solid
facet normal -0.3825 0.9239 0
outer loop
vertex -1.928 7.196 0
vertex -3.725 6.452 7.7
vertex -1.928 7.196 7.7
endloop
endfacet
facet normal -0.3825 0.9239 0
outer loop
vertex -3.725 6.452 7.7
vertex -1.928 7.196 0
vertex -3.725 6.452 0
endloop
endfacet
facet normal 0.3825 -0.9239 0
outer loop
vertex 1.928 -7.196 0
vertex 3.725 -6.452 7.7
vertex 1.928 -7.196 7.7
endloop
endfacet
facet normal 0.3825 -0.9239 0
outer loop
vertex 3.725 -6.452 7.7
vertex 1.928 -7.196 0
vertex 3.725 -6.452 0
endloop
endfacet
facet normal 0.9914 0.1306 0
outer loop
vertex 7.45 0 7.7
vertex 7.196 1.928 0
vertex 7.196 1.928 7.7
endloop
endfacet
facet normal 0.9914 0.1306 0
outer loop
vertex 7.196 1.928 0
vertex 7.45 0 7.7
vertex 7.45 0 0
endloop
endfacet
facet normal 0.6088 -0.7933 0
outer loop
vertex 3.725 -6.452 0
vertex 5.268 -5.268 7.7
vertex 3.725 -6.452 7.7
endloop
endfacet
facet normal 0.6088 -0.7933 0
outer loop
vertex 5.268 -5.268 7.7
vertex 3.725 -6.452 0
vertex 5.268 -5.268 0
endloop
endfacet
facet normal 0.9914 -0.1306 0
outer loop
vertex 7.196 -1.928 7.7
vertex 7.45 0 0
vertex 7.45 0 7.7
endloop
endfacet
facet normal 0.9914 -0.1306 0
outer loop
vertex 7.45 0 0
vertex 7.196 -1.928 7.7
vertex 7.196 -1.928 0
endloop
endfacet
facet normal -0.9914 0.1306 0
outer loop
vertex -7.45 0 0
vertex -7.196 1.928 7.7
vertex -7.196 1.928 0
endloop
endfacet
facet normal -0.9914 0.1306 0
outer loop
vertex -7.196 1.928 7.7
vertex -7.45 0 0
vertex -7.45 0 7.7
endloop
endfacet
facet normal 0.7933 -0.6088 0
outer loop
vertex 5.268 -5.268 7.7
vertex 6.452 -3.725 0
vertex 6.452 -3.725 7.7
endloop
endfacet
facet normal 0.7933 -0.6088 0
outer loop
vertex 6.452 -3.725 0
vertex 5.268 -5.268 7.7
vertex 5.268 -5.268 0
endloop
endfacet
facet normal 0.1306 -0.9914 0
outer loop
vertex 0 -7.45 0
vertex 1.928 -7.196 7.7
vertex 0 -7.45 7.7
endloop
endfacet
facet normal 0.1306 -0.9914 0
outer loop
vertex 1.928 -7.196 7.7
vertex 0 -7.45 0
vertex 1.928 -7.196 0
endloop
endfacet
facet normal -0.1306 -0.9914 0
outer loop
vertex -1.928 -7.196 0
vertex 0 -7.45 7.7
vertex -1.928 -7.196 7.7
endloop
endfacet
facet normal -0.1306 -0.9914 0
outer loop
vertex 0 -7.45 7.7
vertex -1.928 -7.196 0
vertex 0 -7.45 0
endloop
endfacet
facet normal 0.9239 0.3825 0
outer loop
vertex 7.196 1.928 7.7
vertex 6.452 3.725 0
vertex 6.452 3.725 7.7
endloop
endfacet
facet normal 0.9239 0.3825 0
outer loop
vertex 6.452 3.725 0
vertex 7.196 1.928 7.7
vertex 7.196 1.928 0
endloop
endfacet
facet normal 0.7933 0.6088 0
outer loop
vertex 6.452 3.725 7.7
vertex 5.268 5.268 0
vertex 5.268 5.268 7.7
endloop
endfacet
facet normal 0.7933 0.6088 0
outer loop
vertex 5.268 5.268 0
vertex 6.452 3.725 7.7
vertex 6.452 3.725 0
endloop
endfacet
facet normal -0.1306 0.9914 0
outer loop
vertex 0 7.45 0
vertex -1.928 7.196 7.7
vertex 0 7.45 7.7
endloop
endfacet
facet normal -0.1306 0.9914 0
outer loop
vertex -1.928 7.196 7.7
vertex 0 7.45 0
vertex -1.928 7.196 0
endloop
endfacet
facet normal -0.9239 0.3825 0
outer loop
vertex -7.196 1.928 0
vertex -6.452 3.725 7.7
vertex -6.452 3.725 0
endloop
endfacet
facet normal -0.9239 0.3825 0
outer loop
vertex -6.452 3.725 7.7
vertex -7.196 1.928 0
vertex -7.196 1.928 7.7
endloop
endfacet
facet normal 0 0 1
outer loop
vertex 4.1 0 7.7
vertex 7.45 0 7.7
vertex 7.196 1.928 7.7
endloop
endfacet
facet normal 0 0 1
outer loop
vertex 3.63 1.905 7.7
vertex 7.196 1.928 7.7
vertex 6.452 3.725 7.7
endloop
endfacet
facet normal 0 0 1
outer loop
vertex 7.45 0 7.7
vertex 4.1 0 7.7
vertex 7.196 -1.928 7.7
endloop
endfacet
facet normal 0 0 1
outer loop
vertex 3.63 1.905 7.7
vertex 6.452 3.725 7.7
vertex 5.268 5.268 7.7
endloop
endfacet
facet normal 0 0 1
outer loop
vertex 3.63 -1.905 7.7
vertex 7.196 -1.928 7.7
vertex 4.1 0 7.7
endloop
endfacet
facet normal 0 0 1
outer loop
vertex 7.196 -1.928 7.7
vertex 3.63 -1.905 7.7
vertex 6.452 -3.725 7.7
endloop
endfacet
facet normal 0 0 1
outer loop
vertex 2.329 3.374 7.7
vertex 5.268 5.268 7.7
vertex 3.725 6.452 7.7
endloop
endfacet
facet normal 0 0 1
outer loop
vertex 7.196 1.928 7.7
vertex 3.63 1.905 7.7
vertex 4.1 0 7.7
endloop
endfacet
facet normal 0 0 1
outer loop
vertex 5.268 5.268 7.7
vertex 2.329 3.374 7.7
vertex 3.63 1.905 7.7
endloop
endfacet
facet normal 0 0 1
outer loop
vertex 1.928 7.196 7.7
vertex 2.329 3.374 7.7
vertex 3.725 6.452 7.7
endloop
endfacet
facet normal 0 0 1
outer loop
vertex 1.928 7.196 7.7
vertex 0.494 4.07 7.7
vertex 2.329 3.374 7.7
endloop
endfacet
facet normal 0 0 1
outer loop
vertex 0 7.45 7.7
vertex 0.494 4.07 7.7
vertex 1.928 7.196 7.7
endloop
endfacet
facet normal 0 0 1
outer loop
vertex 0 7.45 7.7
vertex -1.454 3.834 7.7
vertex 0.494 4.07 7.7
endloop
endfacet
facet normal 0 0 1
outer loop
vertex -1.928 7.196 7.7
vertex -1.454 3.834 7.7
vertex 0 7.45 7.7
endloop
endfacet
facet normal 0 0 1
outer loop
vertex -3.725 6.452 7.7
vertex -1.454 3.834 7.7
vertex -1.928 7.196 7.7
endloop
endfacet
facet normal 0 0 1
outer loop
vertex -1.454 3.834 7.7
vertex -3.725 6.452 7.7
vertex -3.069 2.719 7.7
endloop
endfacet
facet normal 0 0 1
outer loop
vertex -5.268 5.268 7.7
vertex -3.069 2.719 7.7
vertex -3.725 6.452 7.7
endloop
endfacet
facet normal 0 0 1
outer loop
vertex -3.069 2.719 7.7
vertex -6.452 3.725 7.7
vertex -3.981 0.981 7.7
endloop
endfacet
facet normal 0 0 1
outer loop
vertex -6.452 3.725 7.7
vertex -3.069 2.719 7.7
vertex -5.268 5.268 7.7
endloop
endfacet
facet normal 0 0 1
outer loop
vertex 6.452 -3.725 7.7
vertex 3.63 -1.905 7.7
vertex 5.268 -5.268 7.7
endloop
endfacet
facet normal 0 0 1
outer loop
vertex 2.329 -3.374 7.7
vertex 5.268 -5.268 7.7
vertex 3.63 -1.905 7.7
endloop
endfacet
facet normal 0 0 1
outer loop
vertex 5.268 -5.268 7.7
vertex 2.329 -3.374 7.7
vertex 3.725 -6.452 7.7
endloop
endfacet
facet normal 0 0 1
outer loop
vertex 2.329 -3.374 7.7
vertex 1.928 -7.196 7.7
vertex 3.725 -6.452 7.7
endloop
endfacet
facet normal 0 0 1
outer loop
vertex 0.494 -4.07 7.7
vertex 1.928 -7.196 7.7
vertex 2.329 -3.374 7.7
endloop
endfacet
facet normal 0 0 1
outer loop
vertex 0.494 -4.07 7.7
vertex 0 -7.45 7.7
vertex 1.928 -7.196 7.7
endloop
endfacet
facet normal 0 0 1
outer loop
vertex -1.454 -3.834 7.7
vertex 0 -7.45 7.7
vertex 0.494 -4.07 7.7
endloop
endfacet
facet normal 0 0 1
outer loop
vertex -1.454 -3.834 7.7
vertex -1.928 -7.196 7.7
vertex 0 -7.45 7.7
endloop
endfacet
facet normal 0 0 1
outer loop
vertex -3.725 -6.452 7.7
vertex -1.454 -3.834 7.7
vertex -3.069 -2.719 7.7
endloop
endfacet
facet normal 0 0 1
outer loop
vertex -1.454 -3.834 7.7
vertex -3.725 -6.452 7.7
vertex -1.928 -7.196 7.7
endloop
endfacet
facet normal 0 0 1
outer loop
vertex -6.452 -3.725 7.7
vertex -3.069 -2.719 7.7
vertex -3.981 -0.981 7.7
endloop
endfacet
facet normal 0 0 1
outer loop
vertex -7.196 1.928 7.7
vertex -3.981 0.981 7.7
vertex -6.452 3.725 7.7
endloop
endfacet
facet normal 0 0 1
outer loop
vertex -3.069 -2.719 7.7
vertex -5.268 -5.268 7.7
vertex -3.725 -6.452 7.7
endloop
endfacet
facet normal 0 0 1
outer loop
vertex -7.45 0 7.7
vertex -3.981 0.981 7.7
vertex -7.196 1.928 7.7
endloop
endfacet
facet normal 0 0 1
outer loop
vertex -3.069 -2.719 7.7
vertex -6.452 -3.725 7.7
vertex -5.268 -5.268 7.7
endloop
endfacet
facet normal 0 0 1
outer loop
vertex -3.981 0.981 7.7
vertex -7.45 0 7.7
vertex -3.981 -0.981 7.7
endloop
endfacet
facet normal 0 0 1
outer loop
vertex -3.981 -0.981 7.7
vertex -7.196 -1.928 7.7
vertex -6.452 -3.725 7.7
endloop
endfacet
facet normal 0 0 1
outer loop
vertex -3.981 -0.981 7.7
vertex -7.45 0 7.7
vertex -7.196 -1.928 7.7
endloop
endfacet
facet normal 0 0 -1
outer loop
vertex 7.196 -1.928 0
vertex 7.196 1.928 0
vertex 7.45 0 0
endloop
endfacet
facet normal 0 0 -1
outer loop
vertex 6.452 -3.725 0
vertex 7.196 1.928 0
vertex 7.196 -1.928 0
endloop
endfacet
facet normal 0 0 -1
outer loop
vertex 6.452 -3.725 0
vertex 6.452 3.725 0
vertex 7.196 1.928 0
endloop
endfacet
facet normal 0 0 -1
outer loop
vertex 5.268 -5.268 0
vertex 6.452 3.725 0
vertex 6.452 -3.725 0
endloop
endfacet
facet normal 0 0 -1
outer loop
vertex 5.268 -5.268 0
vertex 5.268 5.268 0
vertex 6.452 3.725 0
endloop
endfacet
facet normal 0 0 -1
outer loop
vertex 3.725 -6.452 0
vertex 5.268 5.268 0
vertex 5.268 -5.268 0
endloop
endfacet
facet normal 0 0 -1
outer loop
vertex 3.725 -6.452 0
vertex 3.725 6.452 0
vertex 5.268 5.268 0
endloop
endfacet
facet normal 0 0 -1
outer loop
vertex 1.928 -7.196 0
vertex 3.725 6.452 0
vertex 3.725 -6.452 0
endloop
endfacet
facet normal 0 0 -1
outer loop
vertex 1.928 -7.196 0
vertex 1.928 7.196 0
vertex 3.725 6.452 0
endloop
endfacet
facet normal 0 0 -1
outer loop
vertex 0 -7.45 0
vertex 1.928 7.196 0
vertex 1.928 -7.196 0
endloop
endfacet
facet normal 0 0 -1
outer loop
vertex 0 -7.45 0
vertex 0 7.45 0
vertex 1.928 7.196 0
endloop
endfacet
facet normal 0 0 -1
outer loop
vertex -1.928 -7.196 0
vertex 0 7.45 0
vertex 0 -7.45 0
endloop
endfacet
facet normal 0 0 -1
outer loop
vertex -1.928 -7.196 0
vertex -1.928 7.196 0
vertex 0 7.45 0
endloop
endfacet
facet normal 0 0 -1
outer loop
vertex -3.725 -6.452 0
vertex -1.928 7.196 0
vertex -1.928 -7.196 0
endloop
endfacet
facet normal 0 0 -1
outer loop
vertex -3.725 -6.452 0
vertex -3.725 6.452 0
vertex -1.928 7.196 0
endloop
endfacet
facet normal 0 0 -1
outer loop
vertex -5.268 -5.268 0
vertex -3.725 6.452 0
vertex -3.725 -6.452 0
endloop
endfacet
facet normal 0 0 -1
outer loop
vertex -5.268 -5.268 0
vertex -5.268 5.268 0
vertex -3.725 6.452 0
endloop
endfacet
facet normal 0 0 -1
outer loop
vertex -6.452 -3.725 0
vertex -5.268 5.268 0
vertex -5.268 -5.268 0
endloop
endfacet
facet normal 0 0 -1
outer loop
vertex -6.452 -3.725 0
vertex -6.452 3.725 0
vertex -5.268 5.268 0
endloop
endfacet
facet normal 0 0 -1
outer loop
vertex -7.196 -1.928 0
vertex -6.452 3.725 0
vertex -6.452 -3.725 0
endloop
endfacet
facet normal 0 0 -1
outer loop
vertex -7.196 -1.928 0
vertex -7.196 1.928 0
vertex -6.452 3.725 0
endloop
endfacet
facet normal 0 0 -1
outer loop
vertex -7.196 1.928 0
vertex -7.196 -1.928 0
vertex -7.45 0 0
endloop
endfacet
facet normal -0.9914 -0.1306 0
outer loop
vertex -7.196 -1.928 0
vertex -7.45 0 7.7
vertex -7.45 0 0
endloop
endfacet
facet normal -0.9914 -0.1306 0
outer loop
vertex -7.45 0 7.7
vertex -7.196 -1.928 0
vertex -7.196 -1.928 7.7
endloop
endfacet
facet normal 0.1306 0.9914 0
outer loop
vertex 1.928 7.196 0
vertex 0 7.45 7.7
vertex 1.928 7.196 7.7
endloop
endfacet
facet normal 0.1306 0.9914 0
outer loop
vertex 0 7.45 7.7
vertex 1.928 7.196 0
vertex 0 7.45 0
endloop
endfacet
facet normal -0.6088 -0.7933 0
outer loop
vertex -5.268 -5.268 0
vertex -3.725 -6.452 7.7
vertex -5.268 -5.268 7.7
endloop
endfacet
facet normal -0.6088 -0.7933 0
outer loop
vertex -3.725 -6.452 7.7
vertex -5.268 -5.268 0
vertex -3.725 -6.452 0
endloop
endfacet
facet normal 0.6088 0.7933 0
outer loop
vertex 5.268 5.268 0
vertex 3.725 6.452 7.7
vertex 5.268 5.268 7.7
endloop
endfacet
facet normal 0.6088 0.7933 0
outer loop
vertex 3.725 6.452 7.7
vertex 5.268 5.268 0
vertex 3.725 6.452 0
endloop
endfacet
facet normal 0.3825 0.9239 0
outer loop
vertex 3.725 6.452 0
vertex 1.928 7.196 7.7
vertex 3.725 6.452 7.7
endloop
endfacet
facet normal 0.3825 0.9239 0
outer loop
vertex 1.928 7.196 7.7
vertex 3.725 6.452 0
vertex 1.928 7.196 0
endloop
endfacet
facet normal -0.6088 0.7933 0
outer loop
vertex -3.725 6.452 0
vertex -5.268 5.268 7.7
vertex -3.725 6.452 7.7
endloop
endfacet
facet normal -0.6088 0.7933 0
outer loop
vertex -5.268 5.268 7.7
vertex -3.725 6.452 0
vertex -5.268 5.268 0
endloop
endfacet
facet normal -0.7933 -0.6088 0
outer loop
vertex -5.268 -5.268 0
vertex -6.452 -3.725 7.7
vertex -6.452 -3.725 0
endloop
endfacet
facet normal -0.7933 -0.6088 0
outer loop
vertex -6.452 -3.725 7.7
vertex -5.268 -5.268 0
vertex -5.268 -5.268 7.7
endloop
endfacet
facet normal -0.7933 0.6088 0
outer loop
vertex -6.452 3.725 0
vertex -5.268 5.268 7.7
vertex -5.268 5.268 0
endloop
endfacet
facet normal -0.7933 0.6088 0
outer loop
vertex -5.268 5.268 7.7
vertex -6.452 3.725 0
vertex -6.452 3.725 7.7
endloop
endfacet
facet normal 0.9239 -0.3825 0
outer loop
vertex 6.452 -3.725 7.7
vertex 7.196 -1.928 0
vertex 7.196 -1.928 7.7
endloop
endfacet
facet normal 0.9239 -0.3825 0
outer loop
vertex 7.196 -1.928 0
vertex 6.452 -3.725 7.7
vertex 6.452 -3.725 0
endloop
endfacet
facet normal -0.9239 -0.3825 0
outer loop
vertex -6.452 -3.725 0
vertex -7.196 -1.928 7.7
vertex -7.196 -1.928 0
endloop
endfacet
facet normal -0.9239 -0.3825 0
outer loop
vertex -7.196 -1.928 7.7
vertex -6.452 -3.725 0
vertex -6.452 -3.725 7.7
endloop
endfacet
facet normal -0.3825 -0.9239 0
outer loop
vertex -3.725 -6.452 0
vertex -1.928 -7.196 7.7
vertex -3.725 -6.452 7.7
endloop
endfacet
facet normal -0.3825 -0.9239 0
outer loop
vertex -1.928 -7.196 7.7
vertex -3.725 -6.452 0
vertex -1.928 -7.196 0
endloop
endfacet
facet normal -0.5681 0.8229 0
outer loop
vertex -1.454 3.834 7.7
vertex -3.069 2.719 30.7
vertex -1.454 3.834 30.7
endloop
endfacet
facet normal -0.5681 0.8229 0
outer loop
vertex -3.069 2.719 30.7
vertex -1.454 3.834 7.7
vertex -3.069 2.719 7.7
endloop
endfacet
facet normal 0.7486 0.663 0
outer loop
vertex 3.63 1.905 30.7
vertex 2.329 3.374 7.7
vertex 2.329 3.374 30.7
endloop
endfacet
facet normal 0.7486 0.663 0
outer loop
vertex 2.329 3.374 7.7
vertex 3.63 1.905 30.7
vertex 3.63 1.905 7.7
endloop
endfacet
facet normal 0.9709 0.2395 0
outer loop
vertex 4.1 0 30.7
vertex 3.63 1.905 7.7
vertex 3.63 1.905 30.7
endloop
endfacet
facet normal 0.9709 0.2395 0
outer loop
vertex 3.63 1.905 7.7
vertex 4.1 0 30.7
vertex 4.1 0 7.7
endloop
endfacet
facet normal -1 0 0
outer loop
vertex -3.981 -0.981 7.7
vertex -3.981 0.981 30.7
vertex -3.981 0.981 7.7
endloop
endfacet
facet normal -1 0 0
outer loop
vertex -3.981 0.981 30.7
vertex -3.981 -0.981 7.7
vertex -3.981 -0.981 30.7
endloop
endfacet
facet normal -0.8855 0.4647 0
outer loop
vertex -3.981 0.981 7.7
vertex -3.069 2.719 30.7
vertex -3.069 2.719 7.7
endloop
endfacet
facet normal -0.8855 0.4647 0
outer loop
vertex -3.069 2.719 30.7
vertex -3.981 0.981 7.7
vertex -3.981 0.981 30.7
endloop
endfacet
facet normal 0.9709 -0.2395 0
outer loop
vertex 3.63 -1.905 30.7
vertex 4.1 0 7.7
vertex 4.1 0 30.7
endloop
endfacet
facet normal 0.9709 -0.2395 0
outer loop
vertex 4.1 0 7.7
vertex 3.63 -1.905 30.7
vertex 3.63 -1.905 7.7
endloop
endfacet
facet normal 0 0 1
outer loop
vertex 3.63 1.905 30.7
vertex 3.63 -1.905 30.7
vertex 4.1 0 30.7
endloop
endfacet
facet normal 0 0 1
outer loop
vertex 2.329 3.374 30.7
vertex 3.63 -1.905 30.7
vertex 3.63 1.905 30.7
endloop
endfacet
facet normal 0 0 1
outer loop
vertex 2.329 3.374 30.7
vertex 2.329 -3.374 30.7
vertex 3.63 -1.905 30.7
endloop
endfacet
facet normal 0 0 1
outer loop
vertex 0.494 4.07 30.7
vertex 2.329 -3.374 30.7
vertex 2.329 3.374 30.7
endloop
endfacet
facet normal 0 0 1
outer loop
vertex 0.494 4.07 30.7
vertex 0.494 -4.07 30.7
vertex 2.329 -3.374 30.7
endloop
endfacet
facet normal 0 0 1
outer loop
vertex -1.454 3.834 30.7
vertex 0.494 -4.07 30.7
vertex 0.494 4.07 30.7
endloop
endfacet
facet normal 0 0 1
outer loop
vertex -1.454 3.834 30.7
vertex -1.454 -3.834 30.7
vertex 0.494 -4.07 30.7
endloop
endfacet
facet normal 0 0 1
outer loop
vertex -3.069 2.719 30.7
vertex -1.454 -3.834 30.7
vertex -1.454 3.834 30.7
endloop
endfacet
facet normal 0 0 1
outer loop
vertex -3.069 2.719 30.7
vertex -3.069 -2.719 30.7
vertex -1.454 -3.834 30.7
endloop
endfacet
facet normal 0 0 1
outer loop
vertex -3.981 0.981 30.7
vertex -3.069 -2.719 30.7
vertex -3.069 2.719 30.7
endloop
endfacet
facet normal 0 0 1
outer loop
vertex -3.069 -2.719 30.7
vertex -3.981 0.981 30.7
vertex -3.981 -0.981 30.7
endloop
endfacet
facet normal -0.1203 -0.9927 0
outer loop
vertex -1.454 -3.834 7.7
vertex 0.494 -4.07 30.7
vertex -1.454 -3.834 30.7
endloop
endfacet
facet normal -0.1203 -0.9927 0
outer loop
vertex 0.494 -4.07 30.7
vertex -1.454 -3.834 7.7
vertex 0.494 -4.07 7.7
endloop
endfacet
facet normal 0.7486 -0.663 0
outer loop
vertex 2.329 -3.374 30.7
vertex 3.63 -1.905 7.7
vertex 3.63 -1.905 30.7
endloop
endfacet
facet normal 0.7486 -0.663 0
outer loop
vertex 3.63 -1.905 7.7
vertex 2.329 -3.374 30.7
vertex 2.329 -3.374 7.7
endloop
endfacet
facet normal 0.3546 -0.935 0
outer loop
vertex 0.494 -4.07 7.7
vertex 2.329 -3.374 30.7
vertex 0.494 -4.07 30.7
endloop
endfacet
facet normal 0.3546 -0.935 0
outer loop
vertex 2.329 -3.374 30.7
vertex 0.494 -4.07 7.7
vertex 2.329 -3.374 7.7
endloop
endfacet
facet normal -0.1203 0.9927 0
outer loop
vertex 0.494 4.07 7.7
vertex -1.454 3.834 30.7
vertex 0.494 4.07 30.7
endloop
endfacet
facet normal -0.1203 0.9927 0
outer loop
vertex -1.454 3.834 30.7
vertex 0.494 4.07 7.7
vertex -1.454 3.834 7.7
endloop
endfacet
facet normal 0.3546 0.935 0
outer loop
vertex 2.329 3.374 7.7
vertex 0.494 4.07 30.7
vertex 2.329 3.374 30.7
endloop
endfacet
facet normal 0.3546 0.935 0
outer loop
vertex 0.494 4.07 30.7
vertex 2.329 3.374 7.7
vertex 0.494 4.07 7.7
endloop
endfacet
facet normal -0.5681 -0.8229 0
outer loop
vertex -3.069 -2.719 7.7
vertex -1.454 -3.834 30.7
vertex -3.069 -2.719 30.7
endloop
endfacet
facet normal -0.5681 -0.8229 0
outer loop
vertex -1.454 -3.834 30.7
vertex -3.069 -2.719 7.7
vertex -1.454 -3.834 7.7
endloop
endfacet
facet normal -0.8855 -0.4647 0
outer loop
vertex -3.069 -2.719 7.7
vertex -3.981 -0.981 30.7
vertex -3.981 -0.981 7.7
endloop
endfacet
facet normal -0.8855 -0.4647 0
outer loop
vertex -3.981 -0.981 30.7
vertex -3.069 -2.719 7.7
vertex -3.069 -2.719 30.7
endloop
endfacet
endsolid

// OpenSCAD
kop_diam = 14.9;
kop_height = 7.7;
stift_diam = 8.2;
stift_height = 23;

translate([0, 0, 0])
{
    cylinder(h = kop_height, r1 = kop_diam / 2, r2 = kop_diam / 2, center = false);
}

translate([0, 0, kop_height])
{
    cylinder(h = stift_height, r1 = stift_diam / 2, r2 = stift_diam / 2, center = false);
}
